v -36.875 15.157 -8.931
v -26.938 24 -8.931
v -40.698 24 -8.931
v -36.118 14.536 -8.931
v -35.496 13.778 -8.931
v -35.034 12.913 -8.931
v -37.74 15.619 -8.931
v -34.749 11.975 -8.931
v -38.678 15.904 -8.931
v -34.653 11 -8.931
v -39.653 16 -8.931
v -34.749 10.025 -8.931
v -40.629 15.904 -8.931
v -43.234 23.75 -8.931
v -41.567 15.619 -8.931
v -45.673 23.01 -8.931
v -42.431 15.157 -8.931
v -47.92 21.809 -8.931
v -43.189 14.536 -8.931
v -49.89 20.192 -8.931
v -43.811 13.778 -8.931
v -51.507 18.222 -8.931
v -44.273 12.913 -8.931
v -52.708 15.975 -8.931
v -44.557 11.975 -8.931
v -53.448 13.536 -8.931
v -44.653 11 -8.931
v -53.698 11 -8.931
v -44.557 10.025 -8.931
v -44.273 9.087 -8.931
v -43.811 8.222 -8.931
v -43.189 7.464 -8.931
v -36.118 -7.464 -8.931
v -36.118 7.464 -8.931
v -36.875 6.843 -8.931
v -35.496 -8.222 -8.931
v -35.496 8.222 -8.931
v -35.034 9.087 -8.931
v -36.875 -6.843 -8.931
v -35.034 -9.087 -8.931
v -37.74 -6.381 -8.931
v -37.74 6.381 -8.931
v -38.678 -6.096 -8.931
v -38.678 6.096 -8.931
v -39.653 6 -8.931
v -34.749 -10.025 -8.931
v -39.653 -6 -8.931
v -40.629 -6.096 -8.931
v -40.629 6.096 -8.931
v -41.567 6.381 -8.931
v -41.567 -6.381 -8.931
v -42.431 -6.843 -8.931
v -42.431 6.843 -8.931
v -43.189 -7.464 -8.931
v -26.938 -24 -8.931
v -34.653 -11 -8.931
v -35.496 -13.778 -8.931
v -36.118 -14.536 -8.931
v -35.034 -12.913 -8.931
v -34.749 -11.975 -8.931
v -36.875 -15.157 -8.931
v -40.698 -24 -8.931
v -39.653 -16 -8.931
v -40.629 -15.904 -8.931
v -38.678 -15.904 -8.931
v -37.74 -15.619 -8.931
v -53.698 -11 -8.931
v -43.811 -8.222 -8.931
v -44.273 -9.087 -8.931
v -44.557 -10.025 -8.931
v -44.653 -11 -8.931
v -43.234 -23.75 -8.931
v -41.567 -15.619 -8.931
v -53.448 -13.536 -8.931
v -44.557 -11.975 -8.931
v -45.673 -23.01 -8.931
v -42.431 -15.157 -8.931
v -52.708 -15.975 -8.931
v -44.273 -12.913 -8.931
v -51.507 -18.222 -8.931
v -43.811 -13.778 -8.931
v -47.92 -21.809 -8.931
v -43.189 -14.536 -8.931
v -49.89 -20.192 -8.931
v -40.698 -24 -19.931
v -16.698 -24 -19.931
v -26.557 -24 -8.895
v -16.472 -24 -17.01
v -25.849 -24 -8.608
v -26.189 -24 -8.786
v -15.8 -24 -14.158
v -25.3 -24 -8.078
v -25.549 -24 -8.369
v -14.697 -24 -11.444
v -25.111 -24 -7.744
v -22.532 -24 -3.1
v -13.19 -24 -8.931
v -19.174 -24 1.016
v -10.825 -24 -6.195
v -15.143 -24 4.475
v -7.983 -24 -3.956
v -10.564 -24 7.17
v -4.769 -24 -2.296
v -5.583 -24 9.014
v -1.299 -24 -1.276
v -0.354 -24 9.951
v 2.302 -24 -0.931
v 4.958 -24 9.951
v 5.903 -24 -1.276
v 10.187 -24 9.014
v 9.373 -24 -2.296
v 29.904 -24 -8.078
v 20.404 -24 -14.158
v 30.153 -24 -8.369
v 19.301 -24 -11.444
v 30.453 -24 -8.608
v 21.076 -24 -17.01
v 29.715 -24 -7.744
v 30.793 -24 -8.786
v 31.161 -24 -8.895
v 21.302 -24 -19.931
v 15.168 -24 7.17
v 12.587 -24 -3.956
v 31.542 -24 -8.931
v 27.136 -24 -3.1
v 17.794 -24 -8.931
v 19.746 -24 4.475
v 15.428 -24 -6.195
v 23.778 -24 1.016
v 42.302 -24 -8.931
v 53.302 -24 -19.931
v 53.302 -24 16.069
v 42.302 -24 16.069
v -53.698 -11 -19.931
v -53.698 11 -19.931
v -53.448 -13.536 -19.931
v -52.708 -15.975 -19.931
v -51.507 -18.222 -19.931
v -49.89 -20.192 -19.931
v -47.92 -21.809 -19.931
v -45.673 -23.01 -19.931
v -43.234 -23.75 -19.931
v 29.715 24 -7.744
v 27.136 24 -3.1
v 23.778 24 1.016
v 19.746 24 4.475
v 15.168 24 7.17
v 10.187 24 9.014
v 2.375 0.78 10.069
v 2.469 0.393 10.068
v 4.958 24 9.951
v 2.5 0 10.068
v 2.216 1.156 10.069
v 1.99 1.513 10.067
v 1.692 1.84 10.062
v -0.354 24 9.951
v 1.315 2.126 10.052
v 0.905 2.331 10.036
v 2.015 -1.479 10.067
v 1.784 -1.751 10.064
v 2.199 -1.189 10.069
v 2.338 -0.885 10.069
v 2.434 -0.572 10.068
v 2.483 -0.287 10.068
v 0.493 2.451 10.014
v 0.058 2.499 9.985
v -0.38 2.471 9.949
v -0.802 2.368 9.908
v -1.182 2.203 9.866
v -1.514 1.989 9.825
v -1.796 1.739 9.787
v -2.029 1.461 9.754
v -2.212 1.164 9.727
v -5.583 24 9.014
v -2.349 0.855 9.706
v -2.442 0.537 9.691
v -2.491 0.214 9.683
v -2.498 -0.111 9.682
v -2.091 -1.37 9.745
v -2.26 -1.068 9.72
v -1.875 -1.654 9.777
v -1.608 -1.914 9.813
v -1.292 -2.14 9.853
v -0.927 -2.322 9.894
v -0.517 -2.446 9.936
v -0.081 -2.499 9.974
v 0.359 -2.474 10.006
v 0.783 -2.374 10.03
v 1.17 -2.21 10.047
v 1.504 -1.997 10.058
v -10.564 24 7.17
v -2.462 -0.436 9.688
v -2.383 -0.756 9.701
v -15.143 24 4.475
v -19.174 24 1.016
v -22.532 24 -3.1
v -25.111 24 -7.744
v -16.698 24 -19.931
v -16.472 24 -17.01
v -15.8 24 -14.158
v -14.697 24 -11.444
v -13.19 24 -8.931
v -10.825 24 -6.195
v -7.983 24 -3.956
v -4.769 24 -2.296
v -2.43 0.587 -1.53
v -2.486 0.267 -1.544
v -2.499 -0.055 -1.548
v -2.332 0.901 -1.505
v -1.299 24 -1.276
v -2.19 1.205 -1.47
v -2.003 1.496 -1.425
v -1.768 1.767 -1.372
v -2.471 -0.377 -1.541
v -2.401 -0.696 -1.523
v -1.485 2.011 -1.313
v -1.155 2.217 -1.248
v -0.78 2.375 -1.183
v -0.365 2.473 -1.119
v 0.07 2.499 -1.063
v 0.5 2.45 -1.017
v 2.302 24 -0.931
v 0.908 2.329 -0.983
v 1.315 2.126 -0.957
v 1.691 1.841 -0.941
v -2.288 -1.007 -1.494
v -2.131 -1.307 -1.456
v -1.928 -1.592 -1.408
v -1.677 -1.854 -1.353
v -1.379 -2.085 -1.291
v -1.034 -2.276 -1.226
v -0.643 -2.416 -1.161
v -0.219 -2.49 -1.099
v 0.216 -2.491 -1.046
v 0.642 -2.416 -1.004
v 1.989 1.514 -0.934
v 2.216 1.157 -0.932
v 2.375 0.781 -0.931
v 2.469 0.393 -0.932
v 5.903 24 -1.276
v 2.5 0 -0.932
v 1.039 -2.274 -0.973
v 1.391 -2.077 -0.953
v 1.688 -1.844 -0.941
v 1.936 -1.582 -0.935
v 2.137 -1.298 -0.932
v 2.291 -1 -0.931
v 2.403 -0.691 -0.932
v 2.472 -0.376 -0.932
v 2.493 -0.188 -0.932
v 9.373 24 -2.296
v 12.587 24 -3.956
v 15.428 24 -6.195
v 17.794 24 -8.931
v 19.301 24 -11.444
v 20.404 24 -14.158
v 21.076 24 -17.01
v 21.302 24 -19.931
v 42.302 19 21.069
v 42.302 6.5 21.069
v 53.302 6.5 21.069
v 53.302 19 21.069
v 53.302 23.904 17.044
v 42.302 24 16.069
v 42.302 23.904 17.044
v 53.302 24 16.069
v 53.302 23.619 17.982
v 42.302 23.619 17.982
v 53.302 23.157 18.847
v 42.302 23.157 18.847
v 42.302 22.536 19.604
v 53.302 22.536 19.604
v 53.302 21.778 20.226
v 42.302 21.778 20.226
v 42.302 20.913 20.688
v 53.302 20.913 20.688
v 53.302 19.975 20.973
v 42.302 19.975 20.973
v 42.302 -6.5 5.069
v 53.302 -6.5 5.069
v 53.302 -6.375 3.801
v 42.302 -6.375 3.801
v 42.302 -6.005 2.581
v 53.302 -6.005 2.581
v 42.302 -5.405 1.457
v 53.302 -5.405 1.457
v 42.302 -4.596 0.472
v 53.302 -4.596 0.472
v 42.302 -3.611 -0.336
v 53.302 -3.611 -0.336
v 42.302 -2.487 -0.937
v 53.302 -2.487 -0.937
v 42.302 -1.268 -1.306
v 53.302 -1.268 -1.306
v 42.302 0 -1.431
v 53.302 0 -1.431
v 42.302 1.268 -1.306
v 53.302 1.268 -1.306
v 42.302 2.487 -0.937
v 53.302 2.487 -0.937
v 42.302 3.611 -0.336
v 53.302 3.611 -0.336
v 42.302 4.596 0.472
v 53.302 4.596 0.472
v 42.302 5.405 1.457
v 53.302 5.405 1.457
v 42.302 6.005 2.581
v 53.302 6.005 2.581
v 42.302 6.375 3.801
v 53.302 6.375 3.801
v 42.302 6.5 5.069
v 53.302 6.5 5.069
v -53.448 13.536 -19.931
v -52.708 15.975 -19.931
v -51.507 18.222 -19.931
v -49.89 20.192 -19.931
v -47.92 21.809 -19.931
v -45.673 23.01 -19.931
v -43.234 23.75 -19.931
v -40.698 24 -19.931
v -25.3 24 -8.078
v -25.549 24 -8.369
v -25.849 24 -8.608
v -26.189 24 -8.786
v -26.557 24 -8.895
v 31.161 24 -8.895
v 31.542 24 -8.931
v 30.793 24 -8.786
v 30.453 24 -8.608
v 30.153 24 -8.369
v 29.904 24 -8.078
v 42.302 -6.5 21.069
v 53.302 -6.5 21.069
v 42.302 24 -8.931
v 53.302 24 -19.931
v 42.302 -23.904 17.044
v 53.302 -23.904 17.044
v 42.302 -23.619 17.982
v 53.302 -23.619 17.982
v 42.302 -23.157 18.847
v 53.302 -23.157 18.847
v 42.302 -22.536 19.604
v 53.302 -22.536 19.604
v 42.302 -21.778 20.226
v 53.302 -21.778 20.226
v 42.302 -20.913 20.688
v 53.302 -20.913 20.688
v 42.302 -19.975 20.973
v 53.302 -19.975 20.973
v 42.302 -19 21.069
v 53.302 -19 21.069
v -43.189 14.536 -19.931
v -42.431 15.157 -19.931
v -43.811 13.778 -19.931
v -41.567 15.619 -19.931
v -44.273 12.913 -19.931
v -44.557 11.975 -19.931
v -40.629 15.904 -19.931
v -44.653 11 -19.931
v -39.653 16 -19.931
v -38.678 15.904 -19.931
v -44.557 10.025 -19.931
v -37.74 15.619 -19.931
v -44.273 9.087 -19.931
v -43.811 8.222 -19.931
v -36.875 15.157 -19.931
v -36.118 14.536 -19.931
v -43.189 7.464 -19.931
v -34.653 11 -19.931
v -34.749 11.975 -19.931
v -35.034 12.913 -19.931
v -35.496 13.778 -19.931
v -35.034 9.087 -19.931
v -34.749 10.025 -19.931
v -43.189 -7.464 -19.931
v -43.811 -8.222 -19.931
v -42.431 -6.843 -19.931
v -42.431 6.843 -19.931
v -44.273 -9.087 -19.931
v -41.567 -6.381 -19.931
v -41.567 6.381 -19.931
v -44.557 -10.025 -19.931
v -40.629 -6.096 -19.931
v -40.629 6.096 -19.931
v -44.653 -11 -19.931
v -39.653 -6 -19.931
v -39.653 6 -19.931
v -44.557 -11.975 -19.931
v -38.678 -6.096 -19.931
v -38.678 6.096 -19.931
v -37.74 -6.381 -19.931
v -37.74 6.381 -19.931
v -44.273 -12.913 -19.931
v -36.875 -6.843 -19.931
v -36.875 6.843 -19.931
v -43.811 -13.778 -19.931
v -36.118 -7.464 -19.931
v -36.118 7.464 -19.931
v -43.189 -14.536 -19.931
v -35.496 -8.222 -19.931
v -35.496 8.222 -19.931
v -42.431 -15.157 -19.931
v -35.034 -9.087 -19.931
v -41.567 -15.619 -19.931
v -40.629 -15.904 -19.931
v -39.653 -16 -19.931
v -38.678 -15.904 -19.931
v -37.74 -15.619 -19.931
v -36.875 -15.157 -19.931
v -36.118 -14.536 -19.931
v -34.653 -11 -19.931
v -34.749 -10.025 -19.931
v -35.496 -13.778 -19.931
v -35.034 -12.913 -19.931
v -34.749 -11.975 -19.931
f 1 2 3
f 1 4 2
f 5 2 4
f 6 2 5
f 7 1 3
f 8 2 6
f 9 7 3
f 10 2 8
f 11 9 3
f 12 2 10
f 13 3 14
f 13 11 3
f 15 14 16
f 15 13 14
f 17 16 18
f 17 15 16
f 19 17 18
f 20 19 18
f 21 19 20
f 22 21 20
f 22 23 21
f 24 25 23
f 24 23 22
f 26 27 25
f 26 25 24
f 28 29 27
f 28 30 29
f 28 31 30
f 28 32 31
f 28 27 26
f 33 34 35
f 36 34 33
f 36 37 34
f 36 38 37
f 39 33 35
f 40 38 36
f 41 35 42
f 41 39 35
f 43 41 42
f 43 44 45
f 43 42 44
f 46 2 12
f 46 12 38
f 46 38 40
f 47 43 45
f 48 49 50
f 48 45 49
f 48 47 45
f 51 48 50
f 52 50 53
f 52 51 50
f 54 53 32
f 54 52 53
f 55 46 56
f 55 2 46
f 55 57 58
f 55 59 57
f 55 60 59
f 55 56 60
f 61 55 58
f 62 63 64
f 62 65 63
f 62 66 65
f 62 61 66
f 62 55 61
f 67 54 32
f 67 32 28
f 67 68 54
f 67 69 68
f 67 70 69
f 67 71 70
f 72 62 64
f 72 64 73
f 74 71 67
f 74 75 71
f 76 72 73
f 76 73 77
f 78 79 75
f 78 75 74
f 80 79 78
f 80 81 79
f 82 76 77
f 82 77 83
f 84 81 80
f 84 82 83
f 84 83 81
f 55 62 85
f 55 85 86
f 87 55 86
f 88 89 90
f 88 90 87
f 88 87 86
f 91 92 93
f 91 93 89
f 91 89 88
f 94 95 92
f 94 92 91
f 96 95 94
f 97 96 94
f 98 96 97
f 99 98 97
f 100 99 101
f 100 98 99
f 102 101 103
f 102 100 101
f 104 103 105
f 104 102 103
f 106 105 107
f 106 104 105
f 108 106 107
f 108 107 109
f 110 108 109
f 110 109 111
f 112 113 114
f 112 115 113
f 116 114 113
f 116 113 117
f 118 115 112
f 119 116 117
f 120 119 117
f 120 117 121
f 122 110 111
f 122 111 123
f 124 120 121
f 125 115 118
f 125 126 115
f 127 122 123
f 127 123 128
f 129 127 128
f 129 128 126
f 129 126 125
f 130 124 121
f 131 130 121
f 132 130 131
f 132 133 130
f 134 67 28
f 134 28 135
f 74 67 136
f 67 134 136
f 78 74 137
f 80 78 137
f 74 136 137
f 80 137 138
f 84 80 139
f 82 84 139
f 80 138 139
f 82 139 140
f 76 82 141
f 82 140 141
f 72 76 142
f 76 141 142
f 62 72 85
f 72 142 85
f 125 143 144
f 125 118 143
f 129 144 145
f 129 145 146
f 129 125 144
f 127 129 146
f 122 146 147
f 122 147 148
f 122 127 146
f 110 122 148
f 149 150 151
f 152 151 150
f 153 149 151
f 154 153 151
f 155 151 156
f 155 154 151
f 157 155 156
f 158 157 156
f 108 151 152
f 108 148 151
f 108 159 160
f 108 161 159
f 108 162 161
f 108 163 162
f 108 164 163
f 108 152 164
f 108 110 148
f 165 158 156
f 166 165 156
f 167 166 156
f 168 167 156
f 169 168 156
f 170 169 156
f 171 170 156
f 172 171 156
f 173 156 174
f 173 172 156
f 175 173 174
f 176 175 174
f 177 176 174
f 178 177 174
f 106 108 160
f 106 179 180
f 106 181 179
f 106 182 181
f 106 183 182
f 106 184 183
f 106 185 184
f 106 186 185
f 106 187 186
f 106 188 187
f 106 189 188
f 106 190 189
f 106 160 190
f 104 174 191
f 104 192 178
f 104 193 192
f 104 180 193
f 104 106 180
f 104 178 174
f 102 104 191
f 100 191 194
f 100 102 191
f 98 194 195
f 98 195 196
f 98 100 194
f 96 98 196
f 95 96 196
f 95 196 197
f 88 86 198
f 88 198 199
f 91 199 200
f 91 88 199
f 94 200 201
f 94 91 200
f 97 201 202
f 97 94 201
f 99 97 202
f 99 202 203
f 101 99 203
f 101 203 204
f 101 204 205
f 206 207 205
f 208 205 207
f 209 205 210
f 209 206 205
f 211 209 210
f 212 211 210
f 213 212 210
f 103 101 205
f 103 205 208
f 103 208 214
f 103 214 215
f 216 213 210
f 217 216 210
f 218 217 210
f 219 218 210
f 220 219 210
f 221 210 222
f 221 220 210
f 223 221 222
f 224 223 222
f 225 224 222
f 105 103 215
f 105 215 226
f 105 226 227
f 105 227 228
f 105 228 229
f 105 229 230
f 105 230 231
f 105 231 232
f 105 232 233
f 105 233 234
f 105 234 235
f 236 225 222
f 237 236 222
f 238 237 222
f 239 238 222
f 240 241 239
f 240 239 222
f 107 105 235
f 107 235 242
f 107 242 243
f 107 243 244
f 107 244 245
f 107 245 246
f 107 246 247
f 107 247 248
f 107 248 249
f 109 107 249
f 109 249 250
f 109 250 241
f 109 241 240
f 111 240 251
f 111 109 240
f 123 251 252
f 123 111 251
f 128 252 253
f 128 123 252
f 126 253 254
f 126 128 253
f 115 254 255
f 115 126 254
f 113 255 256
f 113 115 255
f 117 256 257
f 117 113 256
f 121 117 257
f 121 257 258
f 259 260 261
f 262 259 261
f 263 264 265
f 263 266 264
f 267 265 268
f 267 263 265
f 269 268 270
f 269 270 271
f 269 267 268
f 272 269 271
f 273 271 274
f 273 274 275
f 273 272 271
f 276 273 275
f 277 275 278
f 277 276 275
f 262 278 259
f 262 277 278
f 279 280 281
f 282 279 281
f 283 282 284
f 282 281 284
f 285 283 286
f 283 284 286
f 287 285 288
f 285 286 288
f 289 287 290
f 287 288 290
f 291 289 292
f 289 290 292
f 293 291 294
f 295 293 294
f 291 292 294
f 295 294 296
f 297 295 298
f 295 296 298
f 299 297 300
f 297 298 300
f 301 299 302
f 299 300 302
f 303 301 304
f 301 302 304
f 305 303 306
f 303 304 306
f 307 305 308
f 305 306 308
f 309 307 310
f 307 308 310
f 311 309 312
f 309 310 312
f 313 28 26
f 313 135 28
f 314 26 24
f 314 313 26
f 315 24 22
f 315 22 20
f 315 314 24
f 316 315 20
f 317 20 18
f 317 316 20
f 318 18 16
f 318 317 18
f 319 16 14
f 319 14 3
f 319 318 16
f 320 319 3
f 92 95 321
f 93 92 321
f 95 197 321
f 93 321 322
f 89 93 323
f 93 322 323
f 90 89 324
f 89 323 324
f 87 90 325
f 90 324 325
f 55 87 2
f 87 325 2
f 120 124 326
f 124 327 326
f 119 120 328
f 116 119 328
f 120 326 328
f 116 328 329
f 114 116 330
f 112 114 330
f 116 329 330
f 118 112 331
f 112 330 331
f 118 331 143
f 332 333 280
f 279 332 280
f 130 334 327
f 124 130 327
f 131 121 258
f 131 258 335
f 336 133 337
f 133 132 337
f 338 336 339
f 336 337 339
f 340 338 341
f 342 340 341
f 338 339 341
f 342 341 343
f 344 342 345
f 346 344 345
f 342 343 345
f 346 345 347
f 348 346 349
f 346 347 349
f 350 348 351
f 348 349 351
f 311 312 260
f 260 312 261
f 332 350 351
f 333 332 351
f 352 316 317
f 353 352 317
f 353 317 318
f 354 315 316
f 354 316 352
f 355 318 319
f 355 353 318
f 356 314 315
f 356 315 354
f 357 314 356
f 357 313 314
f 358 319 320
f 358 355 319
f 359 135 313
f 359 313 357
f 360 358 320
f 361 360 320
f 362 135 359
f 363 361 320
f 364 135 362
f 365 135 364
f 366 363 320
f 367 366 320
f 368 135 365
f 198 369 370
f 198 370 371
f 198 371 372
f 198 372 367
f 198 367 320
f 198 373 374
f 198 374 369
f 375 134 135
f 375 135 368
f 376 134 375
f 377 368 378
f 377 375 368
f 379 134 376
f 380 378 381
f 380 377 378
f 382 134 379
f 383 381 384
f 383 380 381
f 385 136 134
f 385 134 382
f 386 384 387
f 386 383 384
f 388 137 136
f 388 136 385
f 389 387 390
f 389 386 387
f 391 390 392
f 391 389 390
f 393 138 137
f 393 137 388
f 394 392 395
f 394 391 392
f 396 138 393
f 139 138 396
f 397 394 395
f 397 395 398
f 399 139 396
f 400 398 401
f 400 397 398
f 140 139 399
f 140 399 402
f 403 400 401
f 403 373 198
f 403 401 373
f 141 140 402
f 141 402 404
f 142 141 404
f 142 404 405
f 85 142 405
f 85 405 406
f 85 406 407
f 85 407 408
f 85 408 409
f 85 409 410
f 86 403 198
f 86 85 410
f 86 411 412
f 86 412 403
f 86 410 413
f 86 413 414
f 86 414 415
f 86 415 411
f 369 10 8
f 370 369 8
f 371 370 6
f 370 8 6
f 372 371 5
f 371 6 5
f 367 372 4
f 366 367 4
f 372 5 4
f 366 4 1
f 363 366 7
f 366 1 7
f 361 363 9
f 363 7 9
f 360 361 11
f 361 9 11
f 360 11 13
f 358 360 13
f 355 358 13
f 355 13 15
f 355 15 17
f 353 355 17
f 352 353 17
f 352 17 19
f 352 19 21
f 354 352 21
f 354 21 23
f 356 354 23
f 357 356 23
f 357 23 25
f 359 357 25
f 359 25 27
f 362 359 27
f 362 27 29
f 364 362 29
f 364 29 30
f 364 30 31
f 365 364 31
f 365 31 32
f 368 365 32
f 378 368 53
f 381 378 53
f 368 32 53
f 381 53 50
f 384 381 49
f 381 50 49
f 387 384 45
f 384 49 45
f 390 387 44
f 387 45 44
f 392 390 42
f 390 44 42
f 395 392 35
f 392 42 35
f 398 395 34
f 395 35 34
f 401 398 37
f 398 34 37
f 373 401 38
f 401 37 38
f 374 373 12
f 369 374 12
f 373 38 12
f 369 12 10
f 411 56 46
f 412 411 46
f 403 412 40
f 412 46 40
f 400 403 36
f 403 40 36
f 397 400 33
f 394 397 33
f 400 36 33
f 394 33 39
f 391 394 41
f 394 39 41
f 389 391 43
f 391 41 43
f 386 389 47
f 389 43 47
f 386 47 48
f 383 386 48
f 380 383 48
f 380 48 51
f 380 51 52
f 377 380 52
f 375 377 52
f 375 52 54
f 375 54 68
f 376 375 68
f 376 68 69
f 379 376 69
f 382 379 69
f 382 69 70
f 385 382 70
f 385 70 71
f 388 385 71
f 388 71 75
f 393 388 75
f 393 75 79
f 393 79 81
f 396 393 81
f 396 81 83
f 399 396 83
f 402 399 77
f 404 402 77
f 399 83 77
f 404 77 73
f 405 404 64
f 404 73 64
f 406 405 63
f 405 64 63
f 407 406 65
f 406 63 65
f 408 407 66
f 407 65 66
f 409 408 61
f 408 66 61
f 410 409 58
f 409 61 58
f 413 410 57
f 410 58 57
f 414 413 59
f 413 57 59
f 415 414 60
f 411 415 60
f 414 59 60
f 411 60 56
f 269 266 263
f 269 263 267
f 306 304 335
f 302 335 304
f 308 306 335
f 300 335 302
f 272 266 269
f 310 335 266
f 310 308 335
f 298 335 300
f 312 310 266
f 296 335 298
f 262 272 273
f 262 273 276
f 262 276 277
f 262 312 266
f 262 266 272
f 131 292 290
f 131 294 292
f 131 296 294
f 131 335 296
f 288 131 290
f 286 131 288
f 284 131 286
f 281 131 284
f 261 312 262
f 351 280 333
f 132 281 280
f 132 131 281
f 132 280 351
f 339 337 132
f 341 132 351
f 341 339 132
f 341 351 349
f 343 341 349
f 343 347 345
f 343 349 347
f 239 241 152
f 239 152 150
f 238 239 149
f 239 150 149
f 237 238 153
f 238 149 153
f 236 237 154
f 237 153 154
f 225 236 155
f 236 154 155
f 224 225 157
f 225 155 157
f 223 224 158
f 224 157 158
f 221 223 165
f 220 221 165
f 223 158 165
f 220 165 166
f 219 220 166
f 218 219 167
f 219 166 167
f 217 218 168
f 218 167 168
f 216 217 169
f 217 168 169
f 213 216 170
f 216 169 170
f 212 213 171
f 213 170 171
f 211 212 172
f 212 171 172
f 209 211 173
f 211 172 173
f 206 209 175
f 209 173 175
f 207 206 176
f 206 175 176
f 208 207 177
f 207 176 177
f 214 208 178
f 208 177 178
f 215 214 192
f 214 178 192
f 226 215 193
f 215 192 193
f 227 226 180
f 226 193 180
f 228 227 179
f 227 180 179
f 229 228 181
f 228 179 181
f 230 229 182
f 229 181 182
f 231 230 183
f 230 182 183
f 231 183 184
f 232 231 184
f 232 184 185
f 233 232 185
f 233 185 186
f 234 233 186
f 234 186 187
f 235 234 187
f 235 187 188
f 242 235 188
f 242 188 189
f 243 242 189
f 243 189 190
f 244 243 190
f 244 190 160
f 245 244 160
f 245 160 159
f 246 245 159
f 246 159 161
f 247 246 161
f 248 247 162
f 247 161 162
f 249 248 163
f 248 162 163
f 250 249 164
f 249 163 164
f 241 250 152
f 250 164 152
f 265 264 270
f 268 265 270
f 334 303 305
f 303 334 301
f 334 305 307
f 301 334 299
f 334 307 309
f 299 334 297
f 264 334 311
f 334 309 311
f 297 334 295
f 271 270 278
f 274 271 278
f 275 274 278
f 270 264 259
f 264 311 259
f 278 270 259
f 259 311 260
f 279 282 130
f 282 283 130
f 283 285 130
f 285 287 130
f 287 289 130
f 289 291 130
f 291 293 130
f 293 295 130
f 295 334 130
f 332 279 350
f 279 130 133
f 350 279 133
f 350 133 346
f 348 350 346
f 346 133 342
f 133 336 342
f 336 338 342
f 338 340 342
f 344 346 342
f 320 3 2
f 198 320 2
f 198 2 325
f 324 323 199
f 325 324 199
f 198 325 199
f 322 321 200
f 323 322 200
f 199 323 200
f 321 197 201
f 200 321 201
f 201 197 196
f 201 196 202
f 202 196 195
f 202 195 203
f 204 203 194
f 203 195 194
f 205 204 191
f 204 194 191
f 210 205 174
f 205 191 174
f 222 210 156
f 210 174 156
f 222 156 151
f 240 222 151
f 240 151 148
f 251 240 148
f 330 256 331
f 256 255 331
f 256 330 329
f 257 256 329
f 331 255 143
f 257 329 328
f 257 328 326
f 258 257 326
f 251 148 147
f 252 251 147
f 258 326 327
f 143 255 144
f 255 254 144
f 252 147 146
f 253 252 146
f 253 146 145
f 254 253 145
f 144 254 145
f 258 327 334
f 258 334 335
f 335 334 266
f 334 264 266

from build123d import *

# Parameters (mm, degrees)
F0_W     = 11
F0_H     = 30
F1_DEPTH = 24
F3_DEPTH = 25
F4_R     = 5
F4_R_2   = 2.5
F5_DEPTH = 25
F6_R     = 13
F7_R     = 5
F8_R     = 2


with BuildPart() as f1:
    # F0 (on Front) → F1 (new body, symmetric)
    with BuildSketch(Plane.XZ):
        with BuildLine():
            ThreePointArc((-27.6980438828, -19.9313075026), (-27.1710581859, -14.3329659721), (-25.6086153568, -8.9313075026))
            Line((-25.6086153568, -8.9313075026), (-53.6980438828, -8.9313075026))
            Line((-53.6980438828, -8.9313075026), (-53.6980438828, -19.9313075026))
            Line((-53.6980438828, -19.9313075026), (-27.6980438828, -19.9313075026))
        make_face()
        with BuildLine():
            Line((-13.1899772677, -8.9313075026), (-25.6086153568, -8.9313075026))
            ThreePointArc((-25.6086153568, -8.9313075026), (-27.1710581859, -14.3329659721), (-27.6980438828, -19.9313075026))
            Line((-27.6980438828, -19.9313075026), (-16.6980438828, -19.9313075026))
            ThreePointArc((-16.6980438828, -19.9313075026), (-15.7997942721, -14.1583851192), (-13.1899772677, -8.9313075026))
        make_face()
        with BuildLine():
            Line((17.793889502, -8.9313075026), (30.2125275911, -8.9313075026))
            ThreePointArc((30.2125275911, -8.9313075026), (2.3019561172, 10.0686924974), (-25.6086153568, -8.9313075026))
            Line((-25.6086153568, -8.9313075026), (-13.1899772677, -8.9313075026))
            ThreePointArc((-13.1899772677, -8.9313075026), (2.3019561172, -0.9313075026), (17.793889502, -8.9313075026))
        make_face()
        with BuildLine():
            ThreePointArc((32.3019561172, -19.9313075026), (31.7749704202, -14.3329659721), (30.2125275911, -8.9313075026))
            Line((30.2125275911, -8.9313075026), (17.793889502, -8.9313075026))
            ThreePointArc((17.793889502, -8.9313075026), (20.4037065064, -14.1583851192), (21.3019561172, -19.9313075026))
            Line((21.3019561172, -19.9313075026), (32.3019561172, -19.9313075026))
        make_face()
        with BuildLine():
            Line((53.3019561172, -8.9313075026), (42.3019561172, -8.9313075026))
            Line((42.3019561172, -8.9313075026), (30.2125275911, -8.9313075026))
            ThreePointArc((30.2125275911, -8.9313075026), (31.7749704202, -14.3329659721), (32.3019561172, -19.9313075026))
            Line((32.3019561172, -19.9313075026), (53.3019561172, -19.9313075026))
            Line((53.3019561172, -19.9313075026), (53.3019561172, -8.9313075026))
        make_face()
        with Locations((47.8019561172, 6.0686924974)):
            Rectangle(F0_W, F0_H)
    extrude(amount=F1_DEPTH, both=True)

    # F2 (on face) → F3 (cut)
    with BuildSketch(Plane.YZ.offset(53.3019561172)):
        with BuildLine():
            ThreePointArc((-6.5, 5.0686926821), (-9.23e-08, -1.4313075026), (6.5, 5.0686924974))
            ThreePointArc((6.5, 5.0686924974), (9.23e-08, 11.5686924974), (-6.5, 5.0686926821))
        make_face()
        with BuildLine():
            ThreePointArc((-6.5, 5.0686926821), (9.23e-08, 11.5686924974), (6.5, 5.0686924974))
            Line((6.5, 5.0686924974), (6.5, 21.0686924974))
            Line((6.5, 21.0686924974), (-6.5, 21.0686924974))
            Line((-6.5, 21.0686924974), (-6.5, 5.0686926821))
        make_face()
    extrude(amount=-F3_DEPTH, mode=Mode.SUBTRACT)

    # F4 (on face) → F5 (cut, symmetric)
    with BuildSketch(Plane.XY.offset(-8.9313075026)):
        with Locations((-39.6533296198, -11)):
            Circle(F4_R)
        with Locations((-39.6533296198, 11)):
            Circle(F4_R)
        Circle(F4_R_2)
    extrude(amount=F5_DEPTH, both=True, mode=Mode.SUBTRACT)

    # F6
    f6_edges = [f1.edges().sort_by_distance(p)[0] for p in [
        (-53.698044, 24, -14.431308),
        (-53.698044, -24, -14.431308),
    ]]
    fillet(f6_edges, radius=F6_R)

    # F7
    f7_edges = [f1.edges().sort_by_distance(p)[0] for p in [
        (47.801956, 24, 21.068692),
        (47.801956, -24, 21.068692),
    ]]
    fillet(f7_edges, radius=F7_R)

    # F8
    f8_edges = [f1.edges().sort_by_distance(p)[0] for p in [
        (30.212528, 0, -8.931308),
        (-25.608615, 0, -8.931308),
    ]]
    fillet(f8_edges, radius=F8_R)


solid = f1.part
